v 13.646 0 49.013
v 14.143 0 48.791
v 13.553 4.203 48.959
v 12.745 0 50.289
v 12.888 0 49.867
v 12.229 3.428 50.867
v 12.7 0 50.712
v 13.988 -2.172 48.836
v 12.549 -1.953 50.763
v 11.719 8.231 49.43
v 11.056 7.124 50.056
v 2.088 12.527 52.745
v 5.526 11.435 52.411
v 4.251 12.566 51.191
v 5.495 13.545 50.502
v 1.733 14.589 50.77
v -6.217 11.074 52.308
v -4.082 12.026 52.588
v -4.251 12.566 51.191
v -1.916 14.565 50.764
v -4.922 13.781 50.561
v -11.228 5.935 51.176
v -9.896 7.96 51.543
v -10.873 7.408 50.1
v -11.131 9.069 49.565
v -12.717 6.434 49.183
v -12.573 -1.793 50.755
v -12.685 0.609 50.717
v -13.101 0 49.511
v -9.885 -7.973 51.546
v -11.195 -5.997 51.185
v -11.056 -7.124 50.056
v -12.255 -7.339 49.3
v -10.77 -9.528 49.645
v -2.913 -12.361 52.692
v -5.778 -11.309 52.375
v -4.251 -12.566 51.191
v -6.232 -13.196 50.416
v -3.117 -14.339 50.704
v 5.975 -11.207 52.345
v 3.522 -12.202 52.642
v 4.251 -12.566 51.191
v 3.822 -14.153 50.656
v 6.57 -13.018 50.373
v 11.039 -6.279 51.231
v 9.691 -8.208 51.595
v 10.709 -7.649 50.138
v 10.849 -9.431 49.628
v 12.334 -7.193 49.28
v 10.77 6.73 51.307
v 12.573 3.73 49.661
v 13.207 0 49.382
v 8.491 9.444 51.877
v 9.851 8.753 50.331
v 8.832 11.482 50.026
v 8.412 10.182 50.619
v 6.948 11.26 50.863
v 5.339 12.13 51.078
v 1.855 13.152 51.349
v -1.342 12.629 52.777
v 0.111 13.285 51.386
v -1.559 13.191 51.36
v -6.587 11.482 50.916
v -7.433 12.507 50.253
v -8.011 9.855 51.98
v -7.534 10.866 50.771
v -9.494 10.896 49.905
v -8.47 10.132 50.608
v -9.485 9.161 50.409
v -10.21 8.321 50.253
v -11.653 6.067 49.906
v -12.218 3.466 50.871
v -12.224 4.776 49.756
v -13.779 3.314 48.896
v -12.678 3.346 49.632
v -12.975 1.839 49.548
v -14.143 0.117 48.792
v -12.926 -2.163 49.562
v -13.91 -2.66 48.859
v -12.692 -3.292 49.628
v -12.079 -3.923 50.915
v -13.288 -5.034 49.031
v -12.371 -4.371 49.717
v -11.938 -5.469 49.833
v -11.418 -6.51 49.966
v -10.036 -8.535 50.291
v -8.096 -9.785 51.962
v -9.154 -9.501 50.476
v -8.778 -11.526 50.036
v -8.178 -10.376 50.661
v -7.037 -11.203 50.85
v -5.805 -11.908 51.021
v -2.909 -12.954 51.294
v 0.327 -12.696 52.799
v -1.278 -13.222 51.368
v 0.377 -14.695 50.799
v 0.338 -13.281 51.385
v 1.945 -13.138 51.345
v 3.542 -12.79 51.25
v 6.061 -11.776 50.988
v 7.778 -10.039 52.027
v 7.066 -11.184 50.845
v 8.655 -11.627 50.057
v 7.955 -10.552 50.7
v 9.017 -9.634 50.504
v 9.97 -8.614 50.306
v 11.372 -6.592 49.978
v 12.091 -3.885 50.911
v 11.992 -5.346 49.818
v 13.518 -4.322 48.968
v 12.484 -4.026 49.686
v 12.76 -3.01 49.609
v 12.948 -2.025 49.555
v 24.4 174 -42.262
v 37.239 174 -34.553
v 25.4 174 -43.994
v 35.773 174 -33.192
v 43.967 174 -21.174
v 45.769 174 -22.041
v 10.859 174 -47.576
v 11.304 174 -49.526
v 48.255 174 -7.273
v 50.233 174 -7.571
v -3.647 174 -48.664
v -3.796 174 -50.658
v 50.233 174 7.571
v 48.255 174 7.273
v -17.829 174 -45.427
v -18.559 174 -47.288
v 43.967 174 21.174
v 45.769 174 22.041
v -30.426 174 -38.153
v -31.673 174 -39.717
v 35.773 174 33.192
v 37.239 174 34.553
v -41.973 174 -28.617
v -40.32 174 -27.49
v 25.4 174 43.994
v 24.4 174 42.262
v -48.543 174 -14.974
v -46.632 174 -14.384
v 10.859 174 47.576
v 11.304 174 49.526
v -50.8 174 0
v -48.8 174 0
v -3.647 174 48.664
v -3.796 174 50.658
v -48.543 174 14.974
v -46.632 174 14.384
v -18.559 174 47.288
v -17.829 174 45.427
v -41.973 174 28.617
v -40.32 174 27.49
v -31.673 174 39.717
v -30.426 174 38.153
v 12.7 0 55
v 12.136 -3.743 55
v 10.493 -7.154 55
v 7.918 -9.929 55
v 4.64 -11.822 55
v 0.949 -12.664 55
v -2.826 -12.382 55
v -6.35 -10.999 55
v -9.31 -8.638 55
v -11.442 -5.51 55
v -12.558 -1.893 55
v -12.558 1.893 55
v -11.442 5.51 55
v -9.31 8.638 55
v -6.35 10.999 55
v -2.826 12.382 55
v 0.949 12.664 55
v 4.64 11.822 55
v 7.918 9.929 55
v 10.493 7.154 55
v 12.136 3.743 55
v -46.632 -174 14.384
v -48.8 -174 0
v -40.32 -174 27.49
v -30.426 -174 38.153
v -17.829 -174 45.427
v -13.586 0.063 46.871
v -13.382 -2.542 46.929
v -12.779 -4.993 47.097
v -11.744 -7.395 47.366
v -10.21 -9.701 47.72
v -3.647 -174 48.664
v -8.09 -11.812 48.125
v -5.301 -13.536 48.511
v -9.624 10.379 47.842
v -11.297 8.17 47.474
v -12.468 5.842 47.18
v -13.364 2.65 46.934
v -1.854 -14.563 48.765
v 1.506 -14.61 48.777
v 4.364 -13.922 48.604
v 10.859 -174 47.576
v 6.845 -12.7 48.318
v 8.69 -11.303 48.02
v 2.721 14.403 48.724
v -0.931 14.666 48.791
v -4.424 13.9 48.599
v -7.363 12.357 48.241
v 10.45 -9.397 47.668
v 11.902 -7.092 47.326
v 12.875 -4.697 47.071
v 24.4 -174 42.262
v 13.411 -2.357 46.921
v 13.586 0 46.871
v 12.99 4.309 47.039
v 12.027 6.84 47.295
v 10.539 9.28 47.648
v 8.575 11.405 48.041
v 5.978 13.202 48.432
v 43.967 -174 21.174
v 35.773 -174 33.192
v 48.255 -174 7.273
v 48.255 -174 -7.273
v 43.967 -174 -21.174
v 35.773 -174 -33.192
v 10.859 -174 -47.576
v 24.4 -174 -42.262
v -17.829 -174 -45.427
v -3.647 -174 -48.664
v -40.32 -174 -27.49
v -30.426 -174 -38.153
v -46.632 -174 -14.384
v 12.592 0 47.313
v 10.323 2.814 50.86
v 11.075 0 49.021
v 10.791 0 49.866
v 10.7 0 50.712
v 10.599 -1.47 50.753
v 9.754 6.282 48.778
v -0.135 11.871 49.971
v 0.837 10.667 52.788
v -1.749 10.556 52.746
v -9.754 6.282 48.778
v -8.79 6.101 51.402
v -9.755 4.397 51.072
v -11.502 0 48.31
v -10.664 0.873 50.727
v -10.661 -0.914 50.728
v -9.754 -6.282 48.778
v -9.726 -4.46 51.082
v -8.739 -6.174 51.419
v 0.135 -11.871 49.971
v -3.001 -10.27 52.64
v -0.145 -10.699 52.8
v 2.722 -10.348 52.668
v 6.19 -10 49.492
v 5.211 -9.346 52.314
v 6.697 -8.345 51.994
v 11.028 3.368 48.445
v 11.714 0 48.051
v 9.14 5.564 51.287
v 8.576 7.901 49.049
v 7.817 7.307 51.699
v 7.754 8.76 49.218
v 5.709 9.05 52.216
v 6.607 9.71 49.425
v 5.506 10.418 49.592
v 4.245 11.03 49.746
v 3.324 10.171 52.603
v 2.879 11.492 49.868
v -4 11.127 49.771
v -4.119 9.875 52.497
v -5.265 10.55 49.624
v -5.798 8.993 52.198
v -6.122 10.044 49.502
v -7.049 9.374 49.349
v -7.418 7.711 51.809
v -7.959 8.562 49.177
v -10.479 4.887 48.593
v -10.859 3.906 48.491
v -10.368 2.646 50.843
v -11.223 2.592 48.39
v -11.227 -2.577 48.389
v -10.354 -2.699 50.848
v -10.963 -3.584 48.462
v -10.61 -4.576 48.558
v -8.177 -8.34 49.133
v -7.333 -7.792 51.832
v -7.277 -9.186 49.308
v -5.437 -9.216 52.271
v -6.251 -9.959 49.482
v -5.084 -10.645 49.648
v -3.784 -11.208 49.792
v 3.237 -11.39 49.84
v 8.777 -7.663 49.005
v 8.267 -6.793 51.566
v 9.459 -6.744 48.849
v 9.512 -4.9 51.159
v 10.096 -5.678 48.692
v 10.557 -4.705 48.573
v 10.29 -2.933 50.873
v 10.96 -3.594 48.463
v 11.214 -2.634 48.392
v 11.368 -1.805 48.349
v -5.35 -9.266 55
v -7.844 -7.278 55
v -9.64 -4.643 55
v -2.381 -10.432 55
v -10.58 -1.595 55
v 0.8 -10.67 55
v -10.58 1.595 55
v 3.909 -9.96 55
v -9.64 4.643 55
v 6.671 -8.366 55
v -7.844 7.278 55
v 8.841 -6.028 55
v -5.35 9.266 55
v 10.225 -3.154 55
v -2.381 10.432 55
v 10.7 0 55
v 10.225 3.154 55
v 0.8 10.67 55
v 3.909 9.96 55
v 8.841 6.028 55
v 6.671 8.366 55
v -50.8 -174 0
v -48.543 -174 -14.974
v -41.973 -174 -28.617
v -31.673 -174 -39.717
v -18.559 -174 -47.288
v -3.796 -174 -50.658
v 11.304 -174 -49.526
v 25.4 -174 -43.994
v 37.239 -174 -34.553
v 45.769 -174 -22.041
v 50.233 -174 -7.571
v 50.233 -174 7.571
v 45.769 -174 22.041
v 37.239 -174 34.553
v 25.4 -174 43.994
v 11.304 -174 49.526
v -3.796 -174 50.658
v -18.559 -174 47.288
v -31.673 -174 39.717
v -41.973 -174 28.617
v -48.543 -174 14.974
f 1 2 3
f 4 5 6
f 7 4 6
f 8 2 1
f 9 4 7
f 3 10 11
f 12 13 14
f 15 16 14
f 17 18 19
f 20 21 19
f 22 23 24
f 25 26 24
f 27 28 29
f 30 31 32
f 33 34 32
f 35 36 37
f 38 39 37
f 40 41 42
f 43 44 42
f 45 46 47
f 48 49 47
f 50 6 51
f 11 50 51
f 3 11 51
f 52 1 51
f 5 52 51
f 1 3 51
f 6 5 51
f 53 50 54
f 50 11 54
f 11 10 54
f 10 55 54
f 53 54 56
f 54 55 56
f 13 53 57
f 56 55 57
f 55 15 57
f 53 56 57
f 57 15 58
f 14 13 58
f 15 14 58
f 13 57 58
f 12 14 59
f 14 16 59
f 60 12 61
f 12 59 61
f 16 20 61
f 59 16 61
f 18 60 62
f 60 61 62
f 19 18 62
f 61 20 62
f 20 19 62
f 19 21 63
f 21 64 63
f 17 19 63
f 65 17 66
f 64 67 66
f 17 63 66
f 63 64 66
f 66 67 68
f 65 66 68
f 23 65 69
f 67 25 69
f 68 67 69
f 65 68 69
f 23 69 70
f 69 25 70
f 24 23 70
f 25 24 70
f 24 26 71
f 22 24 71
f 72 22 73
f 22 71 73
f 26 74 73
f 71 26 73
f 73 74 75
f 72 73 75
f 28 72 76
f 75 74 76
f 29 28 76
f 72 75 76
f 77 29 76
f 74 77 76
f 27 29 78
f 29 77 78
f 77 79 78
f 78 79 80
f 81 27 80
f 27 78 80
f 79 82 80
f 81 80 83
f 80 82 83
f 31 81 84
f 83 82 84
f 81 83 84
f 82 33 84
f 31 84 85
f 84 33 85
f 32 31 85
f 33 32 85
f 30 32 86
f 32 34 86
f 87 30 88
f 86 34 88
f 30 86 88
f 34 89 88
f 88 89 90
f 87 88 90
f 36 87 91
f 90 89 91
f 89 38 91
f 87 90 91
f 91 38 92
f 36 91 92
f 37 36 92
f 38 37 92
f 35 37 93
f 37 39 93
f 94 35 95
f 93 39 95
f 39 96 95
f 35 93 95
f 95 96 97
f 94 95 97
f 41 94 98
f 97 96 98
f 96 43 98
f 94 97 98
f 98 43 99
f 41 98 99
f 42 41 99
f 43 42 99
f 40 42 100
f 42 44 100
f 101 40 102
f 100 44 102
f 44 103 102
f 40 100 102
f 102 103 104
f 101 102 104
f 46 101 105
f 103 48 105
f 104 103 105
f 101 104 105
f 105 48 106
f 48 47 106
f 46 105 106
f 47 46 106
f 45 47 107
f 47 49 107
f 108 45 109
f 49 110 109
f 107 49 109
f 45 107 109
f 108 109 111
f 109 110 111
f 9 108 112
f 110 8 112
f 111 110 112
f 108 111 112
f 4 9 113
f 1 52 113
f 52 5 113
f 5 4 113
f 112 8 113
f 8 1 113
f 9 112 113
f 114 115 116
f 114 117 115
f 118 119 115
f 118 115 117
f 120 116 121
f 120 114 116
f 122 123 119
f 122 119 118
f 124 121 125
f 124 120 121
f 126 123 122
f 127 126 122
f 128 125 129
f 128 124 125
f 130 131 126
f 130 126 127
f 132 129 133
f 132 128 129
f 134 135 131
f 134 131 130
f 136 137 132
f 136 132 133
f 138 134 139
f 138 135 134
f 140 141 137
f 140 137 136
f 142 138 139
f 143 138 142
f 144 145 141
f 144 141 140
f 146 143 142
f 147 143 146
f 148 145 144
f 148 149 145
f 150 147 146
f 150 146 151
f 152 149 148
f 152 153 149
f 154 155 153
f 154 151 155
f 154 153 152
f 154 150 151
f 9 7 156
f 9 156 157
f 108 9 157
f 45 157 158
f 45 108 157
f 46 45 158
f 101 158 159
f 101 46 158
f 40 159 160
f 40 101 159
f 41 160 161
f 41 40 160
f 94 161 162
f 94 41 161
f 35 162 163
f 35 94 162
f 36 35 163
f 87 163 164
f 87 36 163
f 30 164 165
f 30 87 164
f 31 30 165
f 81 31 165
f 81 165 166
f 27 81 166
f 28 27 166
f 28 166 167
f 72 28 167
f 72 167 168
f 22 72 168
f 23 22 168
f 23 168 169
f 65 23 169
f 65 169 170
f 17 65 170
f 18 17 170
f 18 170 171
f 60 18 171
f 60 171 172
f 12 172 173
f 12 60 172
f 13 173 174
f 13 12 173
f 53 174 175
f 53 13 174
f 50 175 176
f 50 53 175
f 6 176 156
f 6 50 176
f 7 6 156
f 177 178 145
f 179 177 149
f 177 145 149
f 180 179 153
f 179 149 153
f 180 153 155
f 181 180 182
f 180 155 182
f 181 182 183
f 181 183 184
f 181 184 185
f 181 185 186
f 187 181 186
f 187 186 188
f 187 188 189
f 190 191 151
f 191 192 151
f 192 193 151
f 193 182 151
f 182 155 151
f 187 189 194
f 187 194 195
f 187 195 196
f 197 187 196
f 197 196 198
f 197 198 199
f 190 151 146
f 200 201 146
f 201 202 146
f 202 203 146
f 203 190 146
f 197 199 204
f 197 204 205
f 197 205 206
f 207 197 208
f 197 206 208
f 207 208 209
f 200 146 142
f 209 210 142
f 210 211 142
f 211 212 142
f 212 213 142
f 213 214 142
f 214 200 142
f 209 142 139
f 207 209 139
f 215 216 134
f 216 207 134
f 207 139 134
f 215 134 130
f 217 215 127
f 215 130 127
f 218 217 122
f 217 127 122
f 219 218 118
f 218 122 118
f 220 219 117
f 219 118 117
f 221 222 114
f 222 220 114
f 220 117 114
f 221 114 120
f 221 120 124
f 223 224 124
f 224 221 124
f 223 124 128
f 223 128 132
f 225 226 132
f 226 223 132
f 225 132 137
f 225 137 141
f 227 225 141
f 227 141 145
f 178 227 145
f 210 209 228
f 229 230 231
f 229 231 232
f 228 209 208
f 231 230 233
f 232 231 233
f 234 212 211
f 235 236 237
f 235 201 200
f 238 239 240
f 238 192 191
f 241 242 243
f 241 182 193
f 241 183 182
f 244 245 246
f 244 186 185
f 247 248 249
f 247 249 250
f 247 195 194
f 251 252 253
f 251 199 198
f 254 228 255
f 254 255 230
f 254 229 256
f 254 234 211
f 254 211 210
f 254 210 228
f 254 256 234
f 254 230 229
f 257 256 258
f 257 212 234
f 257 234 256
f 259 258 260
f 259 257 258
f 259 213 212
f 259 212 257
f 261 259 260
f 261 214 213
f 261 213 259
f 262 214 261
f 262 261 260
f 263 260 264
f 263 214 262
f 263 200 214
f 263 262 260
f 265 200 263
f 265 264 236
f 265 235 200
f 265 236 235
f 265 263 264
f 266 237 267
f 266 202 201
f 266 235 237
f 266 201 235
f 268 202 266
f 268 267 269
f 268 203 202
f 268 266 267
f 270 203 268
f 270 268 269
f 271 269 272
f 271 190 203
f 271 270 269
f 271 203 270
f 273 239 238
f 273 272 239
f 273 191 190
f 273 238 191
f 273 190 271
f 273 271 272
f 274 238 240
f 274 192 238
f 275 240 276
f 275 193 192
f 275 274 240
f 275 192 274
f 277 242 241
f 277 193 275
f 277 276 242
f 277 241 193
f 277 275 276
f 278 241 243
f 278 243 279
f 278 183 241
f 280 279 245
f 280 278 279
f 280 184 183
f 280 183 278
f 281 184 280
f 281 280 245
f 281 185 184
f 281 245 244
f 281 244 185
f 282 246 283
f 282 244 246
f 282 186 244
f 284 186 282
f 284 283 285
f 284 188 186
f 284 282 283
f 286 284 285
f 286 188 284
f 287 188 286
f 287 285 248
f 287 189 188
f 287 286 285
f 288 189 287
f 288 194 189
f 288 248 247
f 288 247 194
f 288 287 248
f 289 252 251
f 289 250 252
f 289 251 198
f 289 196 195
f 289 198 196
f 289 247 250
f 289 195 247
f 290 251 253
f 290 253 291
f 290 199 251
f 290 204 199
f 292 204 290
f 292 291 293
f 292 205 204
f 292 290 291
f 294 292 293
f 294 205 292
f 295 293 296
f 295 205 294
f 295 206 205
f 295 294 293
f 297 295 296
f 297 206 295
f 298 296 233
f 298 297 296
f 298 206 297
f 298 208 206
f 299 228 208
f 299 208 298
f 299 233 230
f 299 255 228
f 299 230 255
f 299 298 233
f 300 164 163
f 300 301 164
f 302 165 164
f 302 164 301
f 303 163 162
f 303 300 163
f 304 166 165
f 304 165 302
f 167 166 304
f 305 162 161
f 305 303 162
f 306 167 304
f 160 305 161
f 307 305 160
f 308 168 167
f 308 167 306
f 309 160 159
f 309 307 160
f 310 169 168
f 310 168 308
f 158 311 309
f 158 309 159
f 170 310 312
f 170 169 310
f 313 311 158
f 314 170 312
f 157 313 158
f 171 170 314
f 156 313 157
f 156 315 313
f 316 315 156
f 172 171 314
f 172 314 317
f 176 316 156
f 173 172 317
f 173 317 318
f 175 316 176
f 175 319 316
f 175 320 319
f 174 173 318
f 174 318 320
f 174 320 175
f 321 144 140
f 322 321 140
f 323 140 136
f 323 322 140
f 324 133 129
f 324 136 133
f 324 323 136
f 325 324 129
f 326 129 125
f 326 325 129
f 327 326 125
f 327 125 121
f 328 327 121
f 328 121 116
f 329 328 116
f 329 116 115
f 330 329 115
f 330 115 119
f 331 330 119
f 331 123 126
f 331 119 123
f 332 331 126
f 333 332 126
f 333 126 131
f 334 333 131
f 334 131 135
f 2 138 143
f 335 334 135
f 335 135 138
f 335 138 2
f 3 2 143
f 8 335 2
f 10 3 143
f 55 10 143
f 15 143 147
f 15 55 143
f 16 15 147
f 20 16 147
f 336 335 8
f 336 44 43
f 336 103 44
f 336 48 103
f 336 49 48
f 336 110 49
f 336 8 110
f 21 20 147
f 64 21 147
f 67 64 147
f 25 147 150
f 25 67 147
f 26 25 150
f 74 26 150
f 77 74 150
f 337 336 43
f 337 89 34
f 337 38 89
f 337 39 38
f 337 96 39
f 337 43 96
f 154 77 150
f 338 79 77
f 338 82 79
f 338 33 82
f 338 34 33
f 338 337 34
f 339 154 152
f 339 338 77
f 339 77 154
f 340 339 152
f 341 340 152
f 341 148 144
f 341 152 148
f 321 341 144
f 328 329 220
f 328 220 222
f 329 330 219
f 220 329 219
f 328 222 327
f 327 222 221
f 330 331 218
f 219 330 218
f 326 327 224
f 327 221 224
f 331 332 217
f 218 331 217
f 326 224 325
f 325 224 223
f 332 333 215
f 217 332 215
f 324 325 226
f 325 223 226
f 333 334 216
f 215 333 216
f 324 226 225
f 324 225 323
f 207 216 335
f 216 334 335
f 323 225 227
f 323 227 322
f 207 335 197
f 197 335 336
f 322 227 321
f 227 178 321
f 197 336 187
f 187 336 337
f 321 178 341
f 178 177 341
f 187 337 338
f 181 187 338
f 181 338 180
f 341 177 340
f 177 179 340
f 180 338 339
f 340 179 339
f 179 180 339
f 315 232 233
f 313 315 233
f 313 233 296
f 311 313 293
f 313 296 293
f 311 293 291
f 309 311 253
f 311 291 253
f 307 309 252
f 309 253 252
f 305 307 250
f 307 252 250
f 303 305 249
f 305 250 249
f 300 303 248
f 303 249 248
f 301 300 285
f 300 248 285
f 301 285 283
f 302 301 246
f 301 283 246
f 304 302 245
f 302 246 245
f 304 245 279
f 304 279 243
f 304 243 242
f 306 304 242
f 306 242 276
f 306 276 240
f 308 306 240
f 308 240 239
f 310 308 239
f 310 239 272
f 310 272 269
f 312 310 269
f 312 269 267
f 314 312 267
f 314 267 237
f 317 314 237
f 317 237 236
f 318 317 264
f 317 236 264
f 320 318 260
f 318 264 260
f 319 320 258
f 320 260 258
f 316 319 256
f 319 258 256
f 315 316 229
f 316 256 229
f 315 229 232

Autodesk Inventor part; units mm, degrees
ref_plane "YZ Plane" through (0, 0, 0) normal (1, 0, 0) x (0, 1, 0)
ref_plane "XZ Plane" through (0, 0, 0) normal (0, 1, 0) x (-1, 0, 0)
ref_plane "XY Plane" through (0, 0, 0) normal (0, 0, 1) x (1, 0, 0)
sketch "Szkic8" plane through (0, 0, 0) normal (0, 1, 0) x (-1, 0, 0)
  circle A0 centre (0, 0) radius 50.8
  circle A1 centre (0, 0) radius 48.8
  dimension "d53" = 101.6
  dimension "d54" = 2
extrude "Wyciągnięcie proste2" add sketch "Szkic8" along normal mid plane 348
sketch "Szkic13" plane through (0, 0, 0) normal (0, 0, 1) x (1, 0, 0)
  circle A0 centre (0, 0) radius 12.7
  circle A1 centre (0, 0) radius 10.7
  dimension "d67" = 25.4
  dimension "d68" = 2
extrude "Wyciągnięcie proste6" add sketch "Szkic13" along normal blind 55
sketch "Szkic14" plane through (0, 0, 55) normal (0, 0, 1) x (1, 0, 0)
  circle A0 centre (0, 0) radius 10.7 projected
extrude "Wyciągnięcie proste7" cut sketch "Szkic14" against normal blind 55
sketch "Szkic15" plane through (0, -174, 0) normal (0, -1, 0) x (1, 0, 0)
  circle A0 centre (0, 0) radius 48.8 projected
extrude "Wyciągnięcie proste8" cut sketch "Szkic15" against normal blind 348
fillet "Zaokrąglenie3" radius 2 2 edges at (0, 12.7, 50.8) (-0.0026, -12.7, 50.8)
fillet "Zaokrąglenie4" radius 4 2 edges at (0.0357, -10.6999, 48.8) (-0.0345, 10.6999, 48.8)
equation "\"d53\" = OD"
equation "\"d54\" = THK"
equation "\"d55\" = L1"
equation "\"d67\" = OD2"
equation "\"d68\" = THK"
equation "\"d69\" = L2"
equation "\"d71\" = L2"
equation "\"d73\" = L1"
equation "\"d75\" = THK"
equation "\"d76\" = 2 * THK"
equation "\"SzerokośćGięciaPodcięcia\" = Grubość"
equation "\"RozmiarPodcięciaNarożnika\" = 4 * Grubość"
equation "\"PromieńPrzejścia\" = PromieńGięcia"
equation "\"Rozmiar_promienia_Jacobiego\" = PromieńGięcia"
equation "\"Wielk_odstępu\" = Grubość"
equation "\"d2\" = PromieńGięcia"
equation "\"d23\" = PromieńGięcia"
equation "\"OD\" = 101.6"
equation "\"THK\" = 2"
equation "\"L1\" = 348"
equation "\"L2\" = 55"
equation "\"OD2\" = 25.4"
equation "\"Grubość\" = 1.5"
equation "\"PromieńGięcia\" = 3"
properties part number "Trójnik red. krótki  Ø101,6 25,4 101,6 s=2 L=348" material "304"
